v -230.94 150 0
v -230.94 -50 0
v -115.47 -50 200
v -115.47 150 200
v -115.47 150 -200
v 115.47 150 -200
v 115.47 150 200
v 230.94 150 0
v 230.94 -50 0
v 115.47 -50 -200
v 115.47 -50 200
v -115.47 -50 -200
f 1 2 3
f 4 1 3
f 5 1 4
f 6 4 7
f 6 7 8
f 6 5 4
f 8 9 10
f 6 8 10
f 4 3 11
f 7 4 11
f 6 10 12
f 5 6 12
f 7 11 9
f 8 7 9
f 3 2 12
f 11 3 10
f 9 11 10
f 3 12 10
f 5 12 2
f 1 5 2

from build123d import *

# Parameters (mm, degrees)
EXTRUDE_1_DEPTH      = 150
EXTRUDE_1_DEPTH_BACK = 50


with BuildPart() as part:
    # 草图1 → 凸台-拉伸1 (new, two sides: drawn at the far end of the back side and taken through both)
    with BuildSketch(Plane(origin=(0, 0, 0), x_dir=(1, 0, 0), z_dir=(0, 1, 0)).offset(-EXTRUDE_1_DEPTH_BACK)):
        Polygon((230.940107676, 0), (115.470053838, 200), (-115.470053838, 200), (-230.940107676, 0), (-115.470053838, -200), (115.470053838, -200), align=None)
    extrude(amount=EXTRUDE_1_DEPTH + EXTRUDE_1_DEPTH_BACK)


solid = part.part
